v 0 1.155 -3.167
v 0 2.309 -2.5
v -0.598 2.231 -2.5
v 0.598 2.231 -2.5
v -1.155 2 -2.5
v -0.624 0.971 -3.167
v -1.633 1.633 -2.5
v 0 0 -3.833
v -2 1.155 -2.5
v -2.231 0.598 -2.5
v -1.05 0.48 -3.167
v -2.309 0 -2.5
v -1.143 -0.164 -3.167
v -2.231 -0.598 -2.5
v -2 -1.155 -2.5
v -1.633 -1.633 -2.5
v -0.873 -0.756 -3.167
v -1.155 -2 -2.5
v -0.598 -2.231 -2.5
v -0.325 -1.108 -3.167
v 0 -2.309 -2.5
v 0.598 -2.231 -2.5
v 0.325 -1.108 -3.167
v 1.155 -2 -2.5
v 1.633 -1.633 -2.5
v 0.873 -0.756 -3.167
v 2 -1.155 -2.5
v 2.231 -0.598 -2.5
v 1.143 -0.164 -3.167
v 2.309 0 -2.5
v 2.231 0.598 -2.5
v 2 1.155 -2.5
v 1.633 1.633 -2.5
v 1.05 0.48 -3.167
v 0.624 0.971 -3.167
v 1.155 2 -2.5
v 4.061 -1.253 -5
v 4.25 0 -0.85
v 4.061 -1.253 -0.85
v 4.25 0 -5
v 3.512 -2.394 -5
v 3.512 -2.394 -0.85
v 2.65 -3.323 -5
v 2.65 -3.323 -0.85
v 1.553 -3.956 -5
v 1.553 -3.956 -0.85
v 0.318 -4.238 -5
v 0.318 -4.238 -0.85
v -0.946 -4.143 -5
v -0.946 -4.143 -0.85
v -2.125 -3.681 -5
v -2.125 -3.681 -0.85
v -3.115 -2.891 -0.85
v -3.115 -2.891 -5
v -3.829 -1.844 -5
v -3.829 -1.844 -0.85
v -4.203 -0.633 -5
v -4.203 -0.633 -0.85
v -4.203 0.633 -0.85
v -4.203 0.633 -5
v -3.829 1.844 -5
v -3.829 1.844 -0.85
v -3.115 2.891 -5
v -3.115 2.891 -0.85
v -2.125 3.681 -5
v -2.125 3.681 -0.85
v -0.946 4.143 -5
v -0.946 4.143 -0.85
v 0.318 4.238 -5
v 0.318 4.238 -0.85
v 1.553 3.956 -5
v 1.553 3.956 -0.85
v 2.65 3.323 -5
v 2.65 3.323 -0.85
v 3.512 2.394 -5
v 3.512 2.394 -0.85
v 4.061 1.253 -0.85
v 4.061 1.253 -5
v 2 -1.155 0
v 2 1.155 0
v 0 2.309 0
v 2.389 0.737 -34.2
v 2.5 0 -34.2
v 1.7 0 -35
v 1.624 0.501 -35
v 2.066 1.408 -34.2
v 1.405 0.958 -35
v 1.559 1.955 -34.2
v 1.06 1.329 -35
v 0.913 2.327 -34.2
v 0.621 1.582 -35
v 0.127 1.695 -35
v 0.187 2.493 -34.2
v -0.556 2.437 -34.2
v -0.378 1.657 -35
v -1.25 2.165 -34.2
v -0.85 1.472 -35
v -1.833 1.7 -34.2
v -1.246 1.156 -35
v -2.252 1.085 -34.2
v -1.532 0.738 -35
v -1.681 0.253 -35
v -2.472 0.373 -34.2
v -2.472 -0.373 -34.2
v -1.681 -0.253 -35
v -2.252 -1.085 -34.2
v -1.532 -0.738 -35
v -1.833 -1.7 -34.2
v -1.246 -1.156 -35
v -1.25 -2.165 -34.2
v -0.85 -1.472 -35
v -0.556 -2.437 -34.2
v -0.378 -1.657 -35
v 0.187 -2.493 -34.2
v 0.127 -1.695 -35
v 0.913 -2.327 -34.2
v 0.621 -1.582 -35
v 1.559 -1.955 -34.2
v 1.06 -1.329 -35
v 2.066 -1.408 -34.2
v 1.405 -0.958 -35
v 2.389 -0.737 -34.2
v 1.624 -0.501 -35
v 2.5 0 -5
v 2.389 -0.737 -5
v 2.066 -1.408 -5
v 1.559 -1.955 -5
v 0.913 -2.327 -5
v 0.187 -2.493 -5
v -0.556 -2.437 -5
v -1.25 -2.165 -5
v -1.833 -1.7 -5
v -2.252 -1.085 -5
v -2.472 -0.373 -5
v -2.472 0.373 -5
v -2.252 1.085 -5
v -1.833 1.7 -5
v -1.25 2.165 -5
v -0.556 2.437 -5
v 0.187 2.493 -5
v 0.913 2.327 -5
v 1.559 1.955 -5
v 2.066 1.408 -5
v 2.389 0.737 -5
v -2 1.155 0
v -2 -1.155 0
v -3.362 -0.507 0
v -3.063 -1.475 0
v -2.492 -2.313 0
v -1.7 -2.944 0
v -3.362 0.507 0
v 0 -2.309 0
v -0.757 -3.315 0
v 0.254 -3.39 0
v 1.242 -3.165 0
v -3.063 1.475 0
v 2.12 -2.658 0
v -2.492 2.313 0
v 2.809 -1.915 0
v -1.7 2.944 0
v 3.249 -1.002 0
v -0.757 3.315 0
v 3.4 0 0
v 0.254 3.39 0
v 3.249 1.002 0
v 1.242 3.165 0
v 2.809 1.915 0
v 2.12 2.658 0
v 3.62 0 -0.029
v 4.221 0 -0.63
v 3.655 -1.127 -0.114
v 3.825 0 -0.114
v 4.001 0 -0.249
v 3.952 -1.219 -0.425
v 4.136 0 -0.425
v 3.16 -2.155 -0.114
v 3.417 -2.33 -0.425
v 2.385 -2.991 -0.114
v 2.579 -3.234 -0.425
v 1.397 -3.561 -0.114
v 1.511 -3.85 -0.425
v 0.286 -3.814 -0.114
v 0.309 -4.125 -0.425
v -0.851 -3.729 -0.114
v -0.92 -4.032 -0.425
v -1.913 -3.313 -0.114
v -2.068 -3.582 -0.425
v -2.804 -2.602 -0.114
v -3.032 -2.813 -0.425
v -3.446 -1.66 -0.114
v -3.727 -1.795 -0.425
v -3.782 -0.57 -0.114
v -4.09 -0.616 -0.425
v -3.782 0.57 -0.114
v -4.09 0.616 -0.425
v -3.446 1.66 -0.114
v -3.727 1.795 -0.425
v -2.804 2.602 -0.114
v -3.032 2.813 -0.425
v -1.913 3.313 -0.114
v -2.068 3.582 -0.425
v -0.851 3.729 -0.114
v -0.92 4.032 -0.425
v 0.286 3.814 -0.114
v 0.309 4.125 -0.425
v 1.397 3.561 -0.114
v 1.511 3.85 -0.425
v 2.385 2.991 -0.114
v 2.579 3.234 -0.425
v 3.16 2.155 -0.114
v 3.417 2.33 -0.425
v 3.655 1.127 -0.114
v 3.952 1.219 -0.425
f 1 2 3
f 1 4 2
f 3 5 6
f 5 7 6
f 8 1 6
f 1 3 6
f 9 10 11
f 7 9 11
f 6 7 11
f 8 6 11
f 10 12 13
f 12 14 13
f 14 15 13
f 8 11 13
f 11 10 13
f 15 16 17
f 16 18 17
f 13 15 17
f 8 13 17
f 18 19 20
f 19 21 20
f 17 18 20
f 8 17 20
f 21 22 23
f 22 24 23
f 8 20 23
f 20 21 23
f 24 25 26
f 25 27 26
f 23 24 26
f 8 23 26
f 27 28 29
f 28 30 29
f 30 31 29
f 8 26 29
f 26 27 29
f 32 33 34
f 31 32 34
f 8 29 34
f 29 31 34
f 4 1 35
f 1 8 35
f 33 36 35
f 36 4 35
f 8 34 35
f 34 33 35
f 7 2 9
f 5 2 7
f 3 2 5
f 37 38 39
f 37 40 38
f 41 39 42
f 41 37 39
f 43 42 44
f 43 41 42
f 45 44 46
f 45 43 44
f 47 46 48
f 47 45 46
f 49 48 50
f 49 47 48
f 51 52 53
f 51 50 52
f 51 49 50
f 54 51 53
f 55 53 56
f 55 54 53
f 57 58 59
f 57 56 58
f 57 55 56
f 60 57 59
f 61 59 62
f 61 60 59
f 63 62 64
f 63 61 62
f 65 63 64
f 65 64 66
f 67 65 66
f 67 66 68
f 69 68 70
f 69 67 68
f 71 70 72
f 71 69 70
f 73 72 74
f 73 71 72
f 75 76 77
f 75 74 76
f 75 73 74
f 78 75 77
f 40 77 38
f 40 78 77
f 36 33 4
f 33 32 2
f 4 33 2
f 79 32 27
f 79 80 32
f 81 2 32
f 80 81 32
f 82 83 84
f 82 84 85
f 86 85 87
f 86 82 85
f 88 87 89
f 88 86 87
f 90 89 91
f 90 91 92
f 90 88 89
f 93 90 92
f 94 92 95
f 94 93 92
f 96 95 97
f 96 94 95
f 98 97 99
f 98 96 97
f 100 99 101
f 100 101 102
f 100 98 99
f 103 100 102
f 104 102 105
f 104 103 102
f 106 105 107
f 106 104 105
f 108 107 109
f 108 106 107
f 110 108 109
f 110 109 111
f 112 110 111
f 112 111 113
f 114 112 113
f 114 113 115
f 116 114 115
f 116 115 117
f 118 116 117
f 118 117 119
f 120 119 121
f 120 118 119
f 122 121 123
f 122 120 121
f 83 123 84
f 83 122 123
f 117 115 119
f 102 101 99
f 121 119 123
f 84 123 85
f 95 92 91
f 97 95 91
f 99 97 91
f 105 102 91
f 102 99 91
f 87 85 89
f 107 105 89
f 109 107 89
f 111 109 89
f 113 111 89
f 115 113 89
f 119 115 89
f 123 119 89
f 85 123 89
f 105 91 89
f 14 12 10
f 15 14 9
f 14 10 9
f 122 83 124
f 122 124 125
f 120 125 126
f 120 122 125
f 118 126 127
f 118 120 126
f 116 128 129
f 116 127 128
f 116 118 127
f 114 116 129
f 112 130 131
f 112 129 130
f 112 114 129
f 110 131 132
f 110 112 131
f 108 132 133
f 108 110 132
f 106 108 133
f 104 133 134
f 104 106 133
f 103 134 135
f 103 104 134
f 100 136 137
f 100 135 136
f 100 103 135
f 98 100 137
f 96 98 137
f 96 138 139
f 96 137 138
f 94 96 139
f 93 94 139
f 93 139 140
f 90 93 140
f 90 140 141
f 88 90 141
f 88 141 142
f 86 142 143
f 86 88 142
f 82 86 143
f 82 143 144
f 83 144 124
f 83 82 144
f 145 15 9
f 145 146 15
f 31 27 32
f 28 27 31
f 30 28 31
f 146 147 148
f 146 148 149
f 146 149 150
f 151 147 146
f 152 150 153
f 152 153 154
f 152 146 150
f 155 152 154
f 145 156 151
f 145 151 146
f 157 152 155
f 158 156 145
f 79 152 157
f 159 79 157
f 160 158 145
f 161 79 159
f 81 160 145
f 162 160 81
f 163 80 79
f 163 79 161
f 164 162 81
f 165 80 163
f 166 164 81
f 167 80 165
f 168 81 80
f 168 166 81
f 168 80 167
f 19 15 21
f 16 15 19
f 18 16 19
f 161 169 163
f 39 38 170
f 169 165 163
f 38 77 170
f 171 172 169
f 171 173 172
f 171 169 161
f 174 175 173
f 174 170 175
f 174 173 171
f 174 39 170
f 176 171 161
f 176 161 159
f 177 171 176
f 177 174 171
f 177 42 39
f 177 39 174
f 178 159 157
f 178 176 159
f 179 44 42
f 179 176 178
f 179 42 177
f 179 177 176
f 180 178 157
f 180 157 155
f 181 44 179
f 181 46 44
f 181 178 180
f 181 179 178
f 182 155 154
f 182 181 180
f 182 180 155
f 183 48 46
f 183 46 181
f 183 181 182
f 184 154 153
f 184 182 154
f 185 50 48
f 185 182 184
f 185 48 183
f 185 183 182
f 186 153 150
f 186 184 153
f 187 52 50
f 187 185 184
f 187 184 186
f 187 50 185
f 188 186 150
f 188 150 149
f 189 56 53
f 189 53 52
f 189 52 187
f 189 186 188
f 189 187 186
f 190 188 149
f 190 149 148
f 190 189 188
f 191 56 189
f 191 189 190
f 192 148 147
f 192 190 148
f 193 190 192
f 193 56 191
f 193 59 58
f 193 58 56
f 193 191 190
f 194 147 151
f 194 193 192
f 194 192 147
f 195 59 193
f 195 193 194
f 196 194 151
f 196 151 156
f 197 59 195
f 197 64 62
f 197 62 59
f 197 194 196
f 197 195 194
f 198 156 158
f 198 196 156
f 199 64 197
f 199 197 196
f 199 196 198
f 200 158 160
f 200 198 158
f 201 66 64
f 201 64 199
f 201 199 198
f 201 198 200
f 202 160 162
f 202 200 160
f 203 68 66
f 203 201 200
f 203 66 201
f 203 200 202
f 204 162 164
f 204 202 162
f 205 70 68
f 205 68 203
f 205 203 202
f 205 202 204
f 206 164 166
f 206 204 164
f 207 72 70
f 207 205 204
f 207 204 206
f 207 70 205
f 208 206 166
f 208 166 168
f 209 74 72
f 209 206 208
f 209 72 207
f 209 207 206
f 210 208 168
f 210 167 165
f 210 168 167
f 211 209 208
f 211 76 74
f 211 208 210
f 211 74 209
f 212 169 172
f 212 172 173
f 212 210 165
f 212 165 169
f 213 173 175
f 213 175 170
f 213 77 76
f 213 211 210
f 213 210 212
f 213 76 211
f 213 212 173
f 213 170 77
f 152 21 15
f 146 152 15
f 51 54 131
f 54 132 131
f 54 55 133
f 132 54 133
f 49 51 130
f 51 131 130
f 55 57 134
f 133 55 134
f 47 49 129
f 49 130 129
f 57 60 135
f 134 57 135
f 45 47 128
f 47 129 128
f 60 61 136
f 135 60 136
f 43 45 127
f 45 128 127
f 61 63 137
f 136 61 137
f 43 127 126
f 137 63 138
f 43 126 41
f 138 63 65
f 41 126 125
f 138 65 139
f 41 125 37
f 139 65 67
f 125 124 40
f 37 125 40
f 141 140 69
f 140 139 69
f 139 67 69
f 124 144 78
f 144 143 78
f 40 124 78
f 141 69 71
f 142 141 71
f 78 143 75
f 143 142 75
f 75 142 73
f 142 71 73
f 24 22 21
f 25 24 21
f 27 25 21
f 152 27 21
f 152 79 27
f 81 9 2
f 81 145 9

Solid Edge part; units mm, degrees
sketch "Sketch1" plane through (0, 0, 0) normal (0, -1, 0) x (1, 0, 0)
  line L0 (0, 0) -> (3.4, 0)
  arc A0 (3.4, 0) -> (4.25, -0.85) centre (3.4, -0.85) cw
  line L1 (4.25, -0.85) -> (4.25, -5)
  line L2 (4.25, -5) -> (2.5, -5)
  line L3 (2.5, -5) -> (2.5, -34.2)
  line L4 (2.5, -34.2) -> (1.7, -35)
  line L5 (1.7, -35) -> (0, -35)
revolve "RevolvedProtrusion1" add sketch "Sketch1" angle 360 about axis through (0, 0, -35) along (0, 0, 1)
sketch "Sketch2" plane through (0, 0, 0) normal (0, 0, 1) x (1, 0, 0)
  line L0 (-2, -1.1547) -> (-2, 1.1547)
  line L1 (-2, 1.1547) -> (0, 2.3094)
  line L2 (0, 2.3094) -> (2, 1.1547)
  line L3 (2, 1.1547) -> (2, -1.1547)
  line L4 (2, -1.1547) -> (0, -2.3094)
  line L5 (0, -2.3094) -> (-2, -1.1547)
extrude "Cutout1" cut sketch "Sketch2" against normal blind 2.5
sketch "Sketch3" plane through (0, 0, 0) normal (1, 0, 0) x (0, 1, 0)
  line L0 (0, -3.8333) -> (2.3094, -2.5)
  line L1 (0, -2.5) -> (2.3094, -2.5)
  line L2 (0, -2.5) -> (0, -3.8333)
revolve "RevolvedCutout1" cut sketch "Sketch3" angle 360 about axis through (0, 0, -60.325) along (0, 0, 1)
cosmetic_thread "Thread1" size "M5"
properties part number "21"
